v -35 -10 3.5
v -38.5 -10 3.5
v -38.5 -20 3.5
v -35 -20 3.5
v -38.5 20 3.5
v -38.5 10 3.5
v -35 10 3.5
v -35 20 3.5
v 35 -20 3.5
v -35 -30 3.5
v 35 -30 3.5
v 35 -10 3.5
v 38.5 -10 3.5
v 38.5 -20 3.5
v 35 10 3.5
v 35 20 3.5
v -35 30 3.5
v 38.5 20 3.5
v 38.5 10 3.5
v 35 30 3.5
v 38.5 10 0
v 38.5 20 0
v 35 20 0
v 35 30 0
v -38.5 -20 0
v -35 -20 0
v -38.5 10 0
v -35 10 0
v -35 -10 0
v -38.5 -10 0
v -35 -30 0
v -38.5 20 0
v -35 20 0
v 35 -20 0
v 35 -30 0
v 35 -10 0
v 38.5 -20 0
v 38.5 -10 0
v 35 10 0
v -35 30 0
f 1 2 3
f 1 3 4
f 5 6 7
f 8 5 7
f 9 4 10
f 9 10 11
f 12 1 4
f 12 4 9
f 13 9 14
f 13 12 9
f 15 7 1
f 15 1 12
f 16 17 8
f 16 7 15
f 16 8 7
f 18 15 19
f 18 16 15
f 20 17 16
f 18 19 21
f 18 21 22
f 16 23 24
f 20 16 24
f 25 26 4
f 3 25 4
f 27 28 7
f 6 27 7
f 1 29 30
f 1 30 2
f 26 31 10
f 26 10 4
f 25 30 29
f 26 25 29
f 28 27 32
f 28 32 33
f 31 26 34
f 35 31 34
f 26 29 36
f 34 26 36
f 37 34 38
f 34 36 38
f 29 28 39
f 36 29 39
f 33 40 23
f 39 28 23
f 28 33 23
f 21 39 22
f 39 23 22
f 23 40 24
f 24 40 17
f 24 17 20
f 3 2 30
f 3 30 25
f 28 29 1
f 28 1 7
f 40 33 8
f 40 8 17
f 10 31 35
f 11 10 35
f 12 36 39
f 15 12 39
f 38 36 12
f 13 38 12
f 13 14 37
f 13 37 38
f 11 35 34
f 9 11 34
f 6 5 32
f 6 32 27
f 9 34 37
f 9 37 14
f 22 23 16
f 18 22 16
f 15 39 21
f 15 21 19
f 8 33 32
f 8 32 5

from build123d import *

# Parameters (mm, degrees)
F0_W     = 70
F0_H     = 60
F1_DEPTH = 3.5
F2_W     = 10
F2_H     = 3.5
F3_DEPTH = 3.5
F4_W     = 10
F4_H     = 3.5
F5_DEPTH = 3.5


with BuildPart() as f1:
    # F0 (on Top) → F1 (new body)
    with BuildSketch(Plane.XY):
        Rectangle(F0_W, F0_H)
    extrude(amount=F1_DEPTH)

    # F2 (on face) → F3 (join)
    with BuildSketch(Plane.YZ.offset(35)):
        with Locations((-15, 1.75)):
            Rectangle(F2_W, F2_H)
        with Locations((15, 1.75)):
            Rectangle(F2_W, F2_H)
    extrude(amount=F3_DEPTH)

    # F4 (on face) → F5 (join)
    with BuildSketch(Plane(origin=(-35, 0, 0), x_dir=(0, -1, 0), z_dir=(-1, 0, 0))):
        with Locations((-15, 1.75)):
            Rectangle(F4_W, F4_H)
        with Locations((15, 1.75)):
            Rectangle(F4_W, F4_H)
    extrude(amount=F5_DEPTH)


solid = f1.part
